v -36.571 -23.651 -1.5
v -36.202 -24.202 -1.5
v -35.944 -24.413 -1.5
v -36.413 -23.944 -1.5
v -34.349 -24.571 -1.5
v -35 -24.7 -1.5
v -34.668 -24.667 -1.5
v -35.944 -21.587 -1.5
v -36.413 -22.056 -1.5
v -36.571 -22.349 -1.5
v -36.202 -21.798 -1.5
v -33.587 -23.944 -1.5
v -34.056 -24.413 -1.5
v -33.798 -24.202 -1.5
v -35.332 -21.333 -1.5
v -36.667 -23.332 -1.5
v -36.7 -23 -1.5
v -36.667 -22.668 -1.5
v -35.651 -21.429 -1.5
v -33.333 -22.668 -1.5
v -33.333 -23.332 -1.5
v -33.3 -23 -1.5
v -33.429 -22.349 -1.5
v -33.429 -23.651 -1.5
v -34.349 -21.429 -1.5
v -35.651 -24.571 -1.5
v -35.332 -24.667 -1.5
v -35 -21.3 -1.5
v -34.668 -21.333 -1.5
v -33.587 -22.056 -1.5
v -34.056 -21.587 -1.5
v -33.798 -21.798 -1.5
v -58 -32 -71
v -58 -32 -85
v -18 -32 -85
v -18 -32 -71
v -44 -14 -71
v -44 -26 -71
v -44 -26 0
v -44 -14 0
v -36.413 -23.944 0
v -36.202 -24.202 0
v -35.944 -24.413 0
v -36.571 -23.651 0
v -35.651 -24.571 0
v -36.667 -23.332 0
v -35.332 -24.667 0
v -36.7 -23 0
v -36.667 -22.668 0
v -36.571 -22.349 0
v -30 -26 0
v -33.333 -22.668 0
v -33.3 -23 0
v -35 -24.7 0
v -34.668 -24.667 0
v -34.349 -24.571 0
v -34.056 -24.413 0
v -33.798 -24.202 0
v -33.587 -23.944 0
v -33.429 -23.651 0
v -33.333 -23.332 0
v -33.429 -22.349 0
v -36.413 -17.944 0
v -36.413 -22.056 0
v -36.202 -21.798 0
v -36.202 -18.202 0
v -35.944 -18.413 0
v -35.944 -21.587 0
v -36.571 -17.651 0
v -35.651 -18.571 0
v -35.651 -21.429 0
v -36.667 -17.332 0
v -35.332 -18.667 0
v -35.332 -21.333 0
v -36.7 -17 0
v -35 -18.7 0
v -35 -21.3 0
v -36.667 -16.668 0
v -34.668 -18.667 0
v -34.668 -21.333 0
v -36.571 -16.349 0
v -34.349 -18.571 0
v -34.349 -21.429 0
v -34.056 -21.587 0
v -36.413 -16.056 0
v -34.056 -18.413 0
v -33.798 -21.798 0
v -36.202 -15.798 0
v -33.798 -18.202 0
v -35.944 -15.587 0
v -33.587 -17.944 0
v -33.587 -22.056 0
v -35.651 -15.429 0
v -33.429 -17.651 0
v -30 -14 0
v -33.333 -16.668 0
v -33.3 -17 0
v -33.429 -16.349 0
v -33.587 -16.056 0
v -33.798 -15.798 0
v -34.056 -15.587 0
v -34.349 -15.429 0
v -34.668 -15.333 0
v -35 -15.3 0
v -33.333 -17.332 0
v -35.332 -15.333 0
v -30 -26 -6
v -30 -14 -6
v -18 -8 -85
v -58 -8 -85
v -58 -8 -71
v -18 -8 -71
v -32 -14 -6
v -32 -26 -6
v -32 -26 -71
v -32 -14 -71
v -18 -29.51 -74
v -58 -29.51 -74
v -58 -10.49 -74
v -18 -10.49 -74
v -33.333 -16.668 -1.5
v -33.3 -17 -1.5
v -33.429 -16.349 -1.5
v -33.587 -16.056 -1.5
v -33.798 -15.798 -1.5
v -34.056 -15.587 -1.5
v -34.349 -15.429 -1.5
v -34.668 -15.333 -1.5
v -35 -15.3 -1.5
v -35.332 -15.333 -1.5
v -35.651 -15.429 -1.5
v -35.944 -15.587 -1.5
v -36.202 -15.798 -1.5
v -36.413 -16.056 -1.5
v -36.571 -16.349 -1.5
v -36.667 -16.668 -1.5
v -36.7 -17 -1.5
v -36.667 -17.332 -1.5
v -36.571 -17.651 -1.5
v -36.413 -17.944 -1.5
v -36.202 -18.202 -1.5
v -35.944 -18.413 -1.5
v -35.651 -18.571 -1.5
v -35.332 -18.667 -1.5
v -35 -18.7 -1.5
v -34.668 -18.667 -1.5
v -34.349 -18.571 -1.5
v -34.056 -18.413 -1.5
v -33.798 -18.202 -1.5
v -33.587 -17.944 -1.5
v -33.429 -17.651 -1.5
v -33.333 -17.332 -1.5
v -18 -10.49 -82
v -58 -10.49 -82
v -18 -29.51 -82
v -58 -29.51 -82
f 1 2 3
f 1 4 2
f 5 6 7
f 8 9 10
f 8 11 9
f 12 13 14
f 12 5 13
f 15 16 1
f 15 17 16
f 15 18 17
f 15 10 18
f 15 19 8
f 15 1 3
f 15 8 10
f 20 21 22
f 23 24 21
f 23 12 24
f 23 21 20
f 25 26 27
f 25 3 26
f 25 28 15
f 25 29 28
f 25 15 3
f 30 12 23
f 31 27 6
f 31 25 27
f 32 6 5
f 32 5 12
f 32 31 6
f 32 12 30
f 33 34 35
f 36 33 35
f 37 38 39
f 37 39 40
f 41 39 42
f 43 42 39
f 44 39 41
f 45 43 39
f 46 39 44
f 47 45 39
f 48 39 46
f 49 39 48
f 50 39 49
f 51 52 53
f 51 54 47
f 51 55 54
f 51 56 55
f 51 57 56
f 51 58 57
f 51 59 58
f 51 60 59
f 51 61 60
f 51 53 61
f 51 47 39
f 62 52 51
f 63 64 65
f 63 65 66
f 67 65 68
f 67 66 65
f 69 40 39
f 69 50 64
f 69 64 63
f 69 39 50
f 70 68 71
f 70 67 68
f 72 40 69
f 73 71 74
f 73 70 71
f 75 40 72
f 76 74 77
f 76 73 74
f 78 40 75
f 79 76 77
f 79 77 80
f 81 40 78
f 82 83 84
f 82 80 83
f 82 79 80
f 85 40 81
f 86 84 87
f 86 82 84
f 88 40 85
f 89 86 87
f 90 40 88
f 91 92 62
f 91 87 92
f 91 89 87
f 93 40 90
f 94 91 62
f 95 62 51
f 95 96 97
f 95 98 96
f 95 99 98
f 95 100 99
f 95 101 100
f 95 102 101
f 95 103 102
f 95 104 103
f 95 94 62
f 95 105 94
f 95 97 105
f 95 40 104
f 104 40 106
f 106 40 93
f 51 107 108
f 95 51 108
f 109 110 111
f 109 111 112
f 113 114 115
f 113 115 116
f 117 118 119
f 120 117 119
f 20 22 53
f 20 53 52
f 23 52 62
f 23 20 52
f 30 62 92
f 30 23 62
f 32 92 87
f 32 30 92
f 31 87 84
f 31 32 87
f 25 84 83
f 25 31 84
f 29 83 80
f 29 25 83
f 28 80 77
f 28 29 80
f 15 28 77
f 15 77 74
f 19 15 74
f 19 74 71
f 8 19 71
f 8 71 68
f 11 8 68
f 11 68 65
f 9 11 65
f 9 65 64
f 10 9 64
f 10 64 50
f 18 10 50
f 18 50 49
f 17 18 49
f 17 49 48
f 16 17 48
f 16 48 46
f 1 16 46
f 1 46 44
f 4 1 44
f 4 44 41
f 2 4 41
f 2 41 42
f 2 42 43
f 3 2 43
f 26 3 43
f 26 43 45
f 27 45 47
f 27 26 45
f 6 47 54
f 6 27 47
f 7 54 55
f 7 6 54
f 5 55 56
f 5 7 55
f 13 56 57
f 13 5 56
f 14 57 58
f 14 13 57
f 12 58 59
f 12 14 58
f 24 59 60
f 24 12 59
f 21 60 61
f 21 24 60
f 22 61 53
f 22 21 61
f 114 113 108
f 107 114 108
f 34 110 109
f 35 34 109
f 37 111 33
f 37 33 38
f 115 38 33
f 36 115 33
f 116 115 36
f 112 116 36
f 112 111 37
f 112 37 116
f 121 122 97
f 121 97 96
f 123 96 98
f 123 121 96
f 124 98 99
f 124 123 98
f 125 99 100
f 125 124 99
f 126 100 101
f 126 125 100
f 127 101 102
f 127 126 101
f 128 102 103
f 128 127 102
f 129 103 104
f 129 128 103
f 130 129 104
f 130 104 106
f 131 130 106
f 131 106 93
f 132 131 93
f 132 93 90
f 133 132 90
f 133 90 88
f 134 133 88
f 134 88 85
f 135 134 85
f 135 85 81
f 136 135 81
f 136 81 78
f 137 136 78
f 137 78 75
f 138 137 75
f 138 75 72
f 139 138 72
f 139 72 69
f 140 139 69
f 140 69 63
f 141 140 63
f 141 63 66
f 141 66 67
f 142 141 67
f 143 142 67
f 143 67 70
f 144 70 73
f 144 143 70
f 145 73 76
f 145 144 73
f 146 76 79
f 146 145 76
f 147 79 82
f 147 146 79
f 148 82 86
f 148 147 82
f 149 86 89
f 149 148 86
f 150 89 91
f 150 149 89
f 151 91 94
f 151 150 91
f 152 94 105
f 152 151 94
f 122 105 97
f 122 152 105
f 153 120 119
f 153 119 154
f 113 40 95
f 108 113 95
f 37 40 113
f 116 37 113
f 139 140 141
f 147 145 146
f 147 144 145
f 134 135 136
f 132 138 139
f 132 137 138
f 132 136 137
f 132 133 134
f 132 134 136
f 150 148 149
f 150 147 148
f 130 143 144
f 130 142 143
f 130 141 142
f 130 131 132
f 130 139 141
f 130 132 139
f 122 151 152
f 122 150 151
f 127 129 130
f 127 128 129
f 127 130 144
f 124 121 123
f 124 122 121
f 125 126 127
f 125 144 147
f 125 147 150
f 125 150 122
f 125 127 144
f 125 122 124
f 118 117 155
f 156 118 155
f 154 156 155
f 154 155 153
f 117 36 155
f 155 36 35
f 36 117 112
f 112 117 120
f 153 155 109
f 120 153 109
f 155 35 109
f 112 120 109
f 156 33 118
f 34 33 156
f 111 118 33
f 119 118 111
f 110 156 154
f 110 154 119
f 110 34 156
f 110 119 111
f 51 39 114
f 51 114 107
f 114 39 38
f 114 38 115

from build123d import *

# Parameters (mm, degrees)
OUTBOARD_FOOT_START                 = -6
SKETCH1_W                           = 14
SKETCH1_H                           = 12
SKETCH1_R                           = 1.7
OUTBOARD_FOOT_DEPTH                 = 6
DROP_WEB_START                      = -71
SKETCH2_W                           = 12
SKETCH2_H                           = 12
DROP_WEB_DEPTH                      = 69.5
CROSS_SLOT_BLOCK_START              = -85
SKETCH3_W                           = 40
SKETCH3_H                           = 24
CROSS_SLOT_BLOCK_DEPTH              = 14
X_FLOATING_Y_DRIVEN_SLOT_DEPTH      = 108.763630228
X_FLOATING_Y_DRIVEN_SLOT_DEPTH_BACK = 108.763630228
SKETCH4_W                           = 8
SKETCH4_H                           = 19.02


with BuildPart() as part:
    # Sketch1 → Outboard_Foot (new body)
    with BuildSketch(Plane.XY.offset(OUTBOARD_FOOT_START)):
        with Locations((-37, -20)):
            Rectangle(SKETCH1_W, SKETCH1_H)
        with Locations((-35, -23)):
            Circle(SKETCH1_R, mode=Mode.SUBTRACT)
        with Locations((-35, -17)):
            Circle(SKETCH1_R, mode=Mode.SUBTRACT)
    extrude(amount=OUTBOARD_FOOT_DEPTH)

    # Sketch2 → Drop_Web (add)
    with BuildSketch(Plane.XY.offset(DROP_WEB_START)):
        with Locations((-38, -20)):
            Rectangle(SKETCH2_W, SKETCH2_H)
    extrude(amount=DROP_WEB_DEPTH)

    # Sketch3 → Cross_Slot_Block (add)
    with BuildSketch(Plane.XY.offset(CROSS_SLOT_BLOCK_START)):
        with Locations((-38, -20)):
            Rectangle(SKETCH3_W, SKETCH3_H)
    extrude(amount=CROSS_SLOT_BLOCK_DEPTH)

    # Sketch4 → X_Floating_Y_Driven_Slot (cut, two sides: drawn at the far end of the back side and taken through both)
    with BuildSketch(Plane(origin=(0, 0, 0), x_dir=(0, 0, -1), z_dir=(1, 0, 0)).offset(-X_FLOATING_Y_DRIVEN_SLOT_DEPTH_BACK)):
        with Locations((78, -20)):
            Rectangle(SKETCH4_W, SKETCH4_H)
    extrude(amount=X_FLOATING_Y_DRIVEN_SLOT_DEPTH + X_FLOATING_Y_DRIVEN_SLOT_DEPTH_BACK, mode=Mode.SUBTRACT)


solid = part.part
